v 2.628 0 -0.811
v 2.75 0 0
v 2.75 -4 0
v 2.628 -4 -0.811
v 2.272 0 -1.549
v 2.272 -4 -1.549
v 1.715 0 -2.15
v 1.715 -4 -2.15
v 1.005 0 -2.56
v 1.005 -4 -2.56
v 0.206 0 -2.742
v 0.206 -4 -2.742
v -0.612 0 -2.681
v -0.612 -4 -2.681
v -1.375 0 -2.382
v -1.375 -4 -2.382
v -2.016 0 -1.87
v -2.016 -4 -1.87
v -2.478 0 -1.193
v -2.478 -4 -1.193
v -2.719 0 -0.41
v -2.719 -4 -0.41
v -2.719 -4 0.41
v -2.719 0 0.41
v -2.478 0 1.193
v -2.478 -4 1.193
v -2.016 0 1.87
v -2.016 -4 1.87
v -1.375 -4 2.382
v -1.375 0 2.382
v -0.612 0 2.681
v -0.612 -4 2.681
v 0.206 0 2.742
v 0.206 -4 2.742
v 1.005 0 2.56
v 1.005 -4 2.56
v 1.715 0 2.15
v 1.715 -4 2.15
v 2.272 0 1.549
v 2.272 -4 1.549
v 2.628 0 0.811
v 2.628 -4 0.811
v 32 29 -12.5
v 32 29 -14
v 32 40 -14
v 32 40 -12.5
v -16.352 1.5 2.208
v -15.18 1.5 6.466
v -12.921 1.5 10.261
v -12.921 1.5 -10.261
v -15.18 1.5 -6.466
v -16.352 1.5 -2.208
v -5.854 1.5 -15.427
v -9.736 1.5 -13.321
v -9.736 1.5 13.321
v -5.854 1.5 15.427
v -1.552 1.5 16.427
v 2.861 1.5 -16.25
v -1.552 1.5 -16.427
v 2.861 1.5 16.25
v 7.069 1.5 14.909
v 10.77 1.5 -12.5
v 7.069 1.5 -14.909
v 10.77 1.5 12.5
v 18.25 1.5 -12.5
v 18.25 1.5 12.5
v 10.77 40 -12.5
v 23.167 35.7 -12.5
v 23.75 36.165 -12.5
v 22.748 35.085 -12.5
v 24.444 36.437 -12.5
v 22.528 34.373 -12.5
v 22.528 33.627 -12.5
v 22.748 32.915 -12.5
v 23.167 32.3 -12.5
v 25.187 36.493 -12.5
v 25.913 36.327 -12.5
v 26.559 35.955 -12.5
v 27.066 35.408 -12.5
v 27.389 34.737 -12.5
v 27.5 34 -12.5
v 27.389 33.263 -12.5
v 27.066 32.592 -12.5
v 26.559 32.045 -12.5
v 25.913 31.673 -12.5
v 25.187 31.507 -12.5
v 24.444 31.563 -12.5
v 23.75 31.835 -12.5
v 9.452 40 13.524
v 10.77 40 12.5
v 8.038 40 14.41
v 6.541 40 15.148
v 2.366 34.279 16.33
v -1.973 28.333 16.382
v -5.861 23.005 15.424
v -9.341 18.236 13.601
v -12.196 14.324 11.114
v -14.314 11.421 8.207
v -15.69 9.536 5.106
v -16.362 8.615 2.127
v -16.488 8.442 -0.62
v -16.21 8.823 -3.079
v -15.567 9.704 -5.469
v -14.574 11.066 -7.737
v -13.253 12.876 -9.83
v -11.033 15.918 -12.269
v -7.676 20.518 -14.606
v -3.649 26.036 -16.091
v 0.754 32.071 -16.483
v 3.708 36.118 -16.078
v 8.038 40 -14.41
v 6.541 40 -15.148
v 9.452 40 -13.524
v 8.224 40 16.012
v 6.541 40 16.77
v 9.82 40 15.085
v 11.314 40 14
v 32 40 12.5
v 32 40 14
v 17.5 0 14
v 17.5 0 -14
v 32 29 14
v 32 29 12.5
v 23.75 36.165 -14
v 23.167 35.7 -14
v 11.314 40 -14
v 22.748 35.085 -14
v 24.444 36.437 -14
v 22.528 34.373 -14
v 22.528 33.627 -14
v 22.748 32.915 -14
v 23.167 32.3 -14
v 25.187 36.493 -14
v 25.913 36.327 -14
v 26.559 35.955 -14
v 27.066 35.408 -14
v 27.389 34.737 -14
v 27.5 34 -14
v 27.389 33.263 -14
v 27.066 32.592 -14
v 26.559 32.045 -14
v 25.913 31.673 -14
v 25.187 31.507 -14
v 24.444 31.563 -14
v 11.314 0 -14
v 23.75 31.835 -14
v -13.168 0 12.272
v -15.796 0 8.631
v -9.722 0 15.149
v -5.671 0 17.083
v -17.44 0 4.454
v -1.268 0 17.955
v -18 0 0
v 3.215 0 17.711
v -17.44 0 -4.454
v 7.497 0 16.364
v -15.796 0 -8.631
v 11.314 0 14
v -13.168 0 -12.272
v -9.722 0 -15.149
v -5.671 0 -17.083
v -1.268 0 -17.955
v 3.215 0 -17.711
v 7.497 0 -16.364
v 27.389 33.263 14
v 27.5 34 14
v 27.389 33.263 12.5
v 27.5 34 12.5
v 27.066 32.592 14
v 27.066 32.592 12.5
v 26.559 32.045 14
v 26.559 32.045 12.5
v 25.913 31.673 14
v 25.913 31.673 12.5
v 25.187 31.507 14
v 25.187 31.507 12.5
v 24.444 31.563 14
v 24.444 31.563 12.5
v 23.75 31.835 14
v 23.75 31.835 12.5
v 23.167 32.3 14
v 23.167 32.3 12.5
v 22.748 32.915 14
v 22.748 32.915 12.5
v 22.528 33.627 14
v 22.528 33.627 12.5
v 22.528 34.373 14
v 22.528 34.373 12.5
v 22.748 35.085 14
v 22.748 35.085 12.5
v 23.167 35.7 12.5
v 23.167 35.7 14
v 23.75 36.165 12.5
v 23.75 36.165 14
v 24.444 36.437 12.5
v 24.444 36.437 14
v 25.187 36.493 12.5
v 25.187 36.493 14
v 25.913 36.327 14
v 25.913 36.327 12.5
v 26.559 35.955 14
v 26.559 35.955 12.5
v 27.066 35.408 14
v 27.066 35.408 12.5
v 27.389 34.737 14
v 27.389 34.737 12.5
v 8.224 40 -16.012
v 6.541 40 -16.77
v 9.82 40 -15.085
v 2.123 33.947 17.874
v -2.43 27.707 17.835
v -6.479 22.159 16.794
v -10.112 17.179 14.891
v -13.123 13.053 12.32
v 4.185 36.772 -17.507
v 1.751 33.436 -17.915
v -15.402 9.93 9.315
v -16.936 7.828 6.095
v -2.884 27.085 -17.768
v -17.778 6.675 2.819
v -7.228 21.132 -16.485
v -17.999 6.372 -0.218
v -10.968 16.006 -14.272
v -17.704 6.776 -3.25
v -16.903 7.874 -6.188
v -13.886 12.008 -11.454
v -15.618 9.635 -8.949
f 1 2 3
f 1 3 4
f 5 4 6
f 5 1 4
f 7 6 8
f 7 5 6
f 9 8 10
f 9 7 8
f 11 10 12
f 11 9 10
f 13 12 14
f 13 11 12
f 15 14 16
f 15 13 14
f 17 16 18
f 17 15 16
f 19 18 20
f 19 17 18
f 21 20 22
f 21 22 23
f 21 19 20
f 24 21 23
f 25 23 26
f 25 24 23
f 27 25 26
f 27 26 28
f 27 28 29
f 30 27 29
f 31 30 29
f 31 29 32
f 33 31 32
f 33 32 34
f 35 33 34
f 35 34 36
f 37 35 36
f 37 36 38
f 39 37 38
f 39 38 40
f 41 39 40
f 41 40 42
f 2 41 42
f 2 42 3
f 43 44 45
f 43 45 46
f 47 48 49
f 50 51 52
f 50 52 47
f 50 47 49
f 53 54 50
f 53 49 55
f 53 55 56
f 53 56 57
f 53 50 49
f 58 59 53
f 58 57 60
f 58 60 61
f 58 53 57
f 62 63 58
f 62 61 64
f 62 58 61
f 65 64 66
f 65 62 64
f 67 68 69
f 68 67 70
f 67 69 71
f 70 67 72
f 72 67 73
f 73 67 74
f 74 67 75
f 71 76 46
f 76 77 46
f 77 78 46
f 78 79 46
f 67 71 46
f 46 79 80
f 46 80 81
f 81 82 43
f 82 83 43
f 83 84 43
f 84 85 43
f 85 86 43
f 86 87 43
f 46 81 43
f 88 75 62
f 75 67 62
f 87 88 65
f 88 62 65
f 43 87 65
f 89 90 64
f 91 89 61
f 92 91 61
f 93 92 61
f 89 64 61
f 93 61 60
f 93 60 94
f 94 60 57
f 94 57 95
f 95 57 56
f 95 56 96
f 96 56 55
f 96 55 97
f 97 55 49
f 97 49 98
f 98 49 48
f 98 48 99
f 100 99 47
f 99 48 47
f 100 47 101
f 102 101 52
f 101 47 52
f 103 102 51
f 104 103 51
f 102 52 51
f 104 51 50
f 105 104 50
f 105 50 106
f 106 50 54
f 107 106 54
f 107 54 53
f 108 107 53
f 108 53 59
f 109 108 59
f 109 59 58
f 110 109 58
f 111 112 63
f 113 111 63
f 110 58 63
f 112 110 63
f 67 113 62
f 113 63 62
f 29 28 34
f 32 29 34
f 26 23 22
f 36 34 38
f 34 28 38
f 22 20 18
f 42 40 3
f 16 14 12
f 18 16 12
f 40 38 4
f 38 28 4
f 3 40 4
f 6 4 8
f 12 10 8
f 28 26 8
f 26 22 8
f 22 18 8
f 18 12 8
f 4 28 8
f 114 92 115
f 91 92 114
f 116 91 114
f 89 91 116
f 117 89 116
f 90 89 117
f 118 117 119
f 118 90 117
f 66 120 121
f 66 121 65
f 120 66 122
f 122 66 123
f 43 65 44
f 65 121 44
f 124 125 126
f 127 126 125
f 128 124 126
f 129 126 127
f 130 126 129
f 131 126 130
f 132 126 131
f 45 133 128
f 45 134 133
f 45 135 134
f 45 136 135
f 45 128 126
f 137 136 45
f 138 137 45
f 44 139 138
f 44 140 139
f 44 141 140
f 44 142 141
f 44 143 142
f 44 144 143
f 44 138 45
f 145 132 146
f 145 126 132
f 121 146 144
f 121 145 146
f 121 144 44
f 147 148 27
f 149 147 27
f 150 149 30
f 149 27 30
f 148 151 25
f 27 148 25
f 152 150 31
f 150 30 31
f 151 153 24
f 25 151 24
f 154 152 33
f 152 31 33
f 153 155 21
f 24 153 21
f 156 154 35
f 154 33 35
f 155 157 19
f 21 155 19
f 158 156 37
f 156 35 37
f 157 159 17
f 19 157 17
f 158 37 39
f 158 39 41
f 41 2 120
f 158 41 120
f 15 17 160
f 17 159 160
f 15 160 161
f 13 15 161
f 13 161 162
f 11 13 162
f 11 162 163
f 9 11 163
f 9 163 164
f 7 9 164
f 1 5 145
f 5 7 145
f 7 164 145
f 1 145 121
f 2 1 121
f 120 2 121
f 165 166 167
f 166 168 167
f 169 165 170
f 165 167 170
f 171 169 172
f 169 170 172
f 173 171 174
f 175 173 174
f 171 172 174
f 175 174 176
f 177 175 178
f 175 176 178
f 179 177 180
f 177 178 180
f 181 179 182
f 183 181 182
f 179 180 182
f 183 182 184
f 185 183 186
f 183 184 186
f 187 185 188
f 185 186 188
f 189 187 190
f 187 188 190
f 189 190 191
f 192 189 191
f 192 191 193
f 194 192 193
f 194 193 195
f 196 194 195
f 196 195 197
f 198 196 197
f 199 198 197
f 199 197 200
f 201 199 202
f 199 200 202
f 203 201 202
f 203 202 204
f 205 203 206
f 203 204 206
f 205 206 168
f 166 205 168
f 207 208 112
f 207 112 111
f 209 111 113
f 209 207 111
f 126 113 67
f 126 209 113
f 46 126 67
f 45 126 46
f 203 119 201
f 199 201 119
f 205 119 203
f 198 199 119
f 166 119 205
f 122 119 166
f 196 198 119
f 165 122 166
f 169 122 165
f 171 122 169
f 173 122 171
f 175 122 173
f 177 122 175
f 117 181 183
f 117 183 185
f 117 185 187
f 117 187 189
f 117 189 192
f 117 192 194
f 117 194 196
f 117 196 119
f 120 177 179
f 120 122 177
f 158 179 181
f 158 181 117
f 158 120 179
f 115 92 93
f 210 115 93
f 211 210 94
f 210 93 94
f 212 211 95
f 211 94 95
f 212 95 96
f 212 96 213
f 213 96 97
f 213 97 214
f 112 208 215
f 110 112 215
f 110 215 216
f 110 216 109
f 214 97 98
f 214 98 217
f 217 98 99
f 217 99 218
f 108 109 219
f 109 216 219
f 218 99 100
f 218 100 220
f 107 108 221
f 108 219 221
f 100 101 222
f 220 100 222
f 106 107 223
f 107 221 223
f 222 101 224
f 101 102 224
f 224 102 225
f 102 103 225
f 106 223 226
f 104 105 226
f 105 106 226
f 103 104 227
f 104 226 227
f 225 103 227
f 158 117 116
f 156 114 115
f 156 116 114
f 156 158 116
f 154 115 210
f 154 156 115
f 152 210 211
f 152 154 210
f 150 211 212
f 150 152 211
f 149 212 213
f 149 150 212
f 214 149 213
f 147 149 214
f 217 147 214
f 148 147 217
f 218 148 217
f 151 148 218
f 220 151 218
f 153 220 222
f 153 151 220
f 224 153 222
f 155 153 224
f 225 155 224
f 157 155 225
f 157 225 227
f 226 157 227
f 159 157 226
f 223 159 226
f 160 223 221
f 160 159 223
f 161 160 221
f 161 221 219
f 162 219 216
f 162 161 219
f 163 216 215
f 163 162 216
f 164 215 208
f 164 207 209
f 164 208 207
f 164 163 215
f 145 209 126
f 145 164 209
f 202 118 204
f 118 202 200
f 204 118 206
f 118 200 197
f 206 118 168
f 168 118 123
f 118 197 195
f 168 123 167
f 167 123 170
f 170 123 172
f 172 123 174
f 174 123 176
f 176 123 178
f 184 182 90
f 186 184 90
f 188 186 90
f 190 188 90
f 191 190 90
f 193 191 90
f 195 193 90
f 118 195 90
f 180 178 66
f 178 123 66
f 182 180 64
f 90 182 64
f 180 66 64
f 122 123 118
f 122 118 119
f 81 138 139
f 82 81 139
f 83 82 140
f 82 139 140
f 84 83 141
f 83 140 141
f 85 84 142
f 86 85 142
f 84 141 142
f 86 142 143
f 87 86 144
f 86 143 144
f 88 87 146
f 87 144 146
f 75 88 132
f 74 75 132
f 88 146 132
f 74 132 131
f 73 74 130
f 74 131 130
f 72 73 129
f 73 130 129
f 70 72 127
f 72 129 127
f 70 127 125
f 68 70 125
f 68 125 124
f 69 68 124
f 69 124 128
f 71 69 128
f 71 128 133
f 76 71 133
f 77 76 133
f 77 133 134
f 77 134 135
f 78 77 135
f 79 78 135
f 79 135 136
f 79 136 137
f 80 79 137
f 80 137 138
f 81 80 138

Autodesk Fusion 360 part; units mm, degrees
sketch "Sketch1" plane through (0, 0, 0) normal (0, 1, 0) x (1, 0, 0)
  line L0 (11.3137, 14) -> (32, 14)
  line L1 (32, 14) -> (32, -14)
  line L2 (32, -14) -> (11.3137, -14)
  arc A0 (11.3137, 14) -> (11.3137, -14) centre (0, 0) ccw
  line L3 (32, -12.5) -> (10.7703, -12.5)
  arc A1 (10.7703, 12.5) -> (10.7703, -12.5) centre (0, 0) ccw
  line L4 (10.7703, 12.5) -> (32, 12.5)
  circle A2 centre (0, 0) radius 2.75
  dimension "d1" = 36
  dimension "d4" = 1.5
  dimension "d5" = 5.5
extrude "Extrude1" add sketch "Sketch1" along normal blind 40 contours L0 L1 L2 A0 L3 A1 L4 | L1 L3 A1 L4 | A2
extrude "Extrude2" cut sketch "Sketch1" along normal through all from surface at 1.5 contours L1 L3 A1 L4 | A2
extrude "Extrude3" add sketch "Sketch1" against normal blind 4 contours A2
sketch "Sketch2" plane through (0, 0, 0) normal (0, 0, 1) x (1, 0, 0)
  line L0 (15.3745, -4.2511) -> (35, 35)
  line L1 (35, 35) -> (35, 42)
  line L2 (35, 42) -> (8, 42)
  line L3 (8, 42) -> (-19, 5)
  line L4 (-19, 5) -> (-19, -4.2511)
  line L5 (-19, -4.2511) -> (15.3745, -4.2511)
  circle A0 centre (25, 34) radius 2.5
  dimension "d12" = 5
extrude "Extrude4" cut sketch "Sketch2" along normal through all and the other way through all keep common part
